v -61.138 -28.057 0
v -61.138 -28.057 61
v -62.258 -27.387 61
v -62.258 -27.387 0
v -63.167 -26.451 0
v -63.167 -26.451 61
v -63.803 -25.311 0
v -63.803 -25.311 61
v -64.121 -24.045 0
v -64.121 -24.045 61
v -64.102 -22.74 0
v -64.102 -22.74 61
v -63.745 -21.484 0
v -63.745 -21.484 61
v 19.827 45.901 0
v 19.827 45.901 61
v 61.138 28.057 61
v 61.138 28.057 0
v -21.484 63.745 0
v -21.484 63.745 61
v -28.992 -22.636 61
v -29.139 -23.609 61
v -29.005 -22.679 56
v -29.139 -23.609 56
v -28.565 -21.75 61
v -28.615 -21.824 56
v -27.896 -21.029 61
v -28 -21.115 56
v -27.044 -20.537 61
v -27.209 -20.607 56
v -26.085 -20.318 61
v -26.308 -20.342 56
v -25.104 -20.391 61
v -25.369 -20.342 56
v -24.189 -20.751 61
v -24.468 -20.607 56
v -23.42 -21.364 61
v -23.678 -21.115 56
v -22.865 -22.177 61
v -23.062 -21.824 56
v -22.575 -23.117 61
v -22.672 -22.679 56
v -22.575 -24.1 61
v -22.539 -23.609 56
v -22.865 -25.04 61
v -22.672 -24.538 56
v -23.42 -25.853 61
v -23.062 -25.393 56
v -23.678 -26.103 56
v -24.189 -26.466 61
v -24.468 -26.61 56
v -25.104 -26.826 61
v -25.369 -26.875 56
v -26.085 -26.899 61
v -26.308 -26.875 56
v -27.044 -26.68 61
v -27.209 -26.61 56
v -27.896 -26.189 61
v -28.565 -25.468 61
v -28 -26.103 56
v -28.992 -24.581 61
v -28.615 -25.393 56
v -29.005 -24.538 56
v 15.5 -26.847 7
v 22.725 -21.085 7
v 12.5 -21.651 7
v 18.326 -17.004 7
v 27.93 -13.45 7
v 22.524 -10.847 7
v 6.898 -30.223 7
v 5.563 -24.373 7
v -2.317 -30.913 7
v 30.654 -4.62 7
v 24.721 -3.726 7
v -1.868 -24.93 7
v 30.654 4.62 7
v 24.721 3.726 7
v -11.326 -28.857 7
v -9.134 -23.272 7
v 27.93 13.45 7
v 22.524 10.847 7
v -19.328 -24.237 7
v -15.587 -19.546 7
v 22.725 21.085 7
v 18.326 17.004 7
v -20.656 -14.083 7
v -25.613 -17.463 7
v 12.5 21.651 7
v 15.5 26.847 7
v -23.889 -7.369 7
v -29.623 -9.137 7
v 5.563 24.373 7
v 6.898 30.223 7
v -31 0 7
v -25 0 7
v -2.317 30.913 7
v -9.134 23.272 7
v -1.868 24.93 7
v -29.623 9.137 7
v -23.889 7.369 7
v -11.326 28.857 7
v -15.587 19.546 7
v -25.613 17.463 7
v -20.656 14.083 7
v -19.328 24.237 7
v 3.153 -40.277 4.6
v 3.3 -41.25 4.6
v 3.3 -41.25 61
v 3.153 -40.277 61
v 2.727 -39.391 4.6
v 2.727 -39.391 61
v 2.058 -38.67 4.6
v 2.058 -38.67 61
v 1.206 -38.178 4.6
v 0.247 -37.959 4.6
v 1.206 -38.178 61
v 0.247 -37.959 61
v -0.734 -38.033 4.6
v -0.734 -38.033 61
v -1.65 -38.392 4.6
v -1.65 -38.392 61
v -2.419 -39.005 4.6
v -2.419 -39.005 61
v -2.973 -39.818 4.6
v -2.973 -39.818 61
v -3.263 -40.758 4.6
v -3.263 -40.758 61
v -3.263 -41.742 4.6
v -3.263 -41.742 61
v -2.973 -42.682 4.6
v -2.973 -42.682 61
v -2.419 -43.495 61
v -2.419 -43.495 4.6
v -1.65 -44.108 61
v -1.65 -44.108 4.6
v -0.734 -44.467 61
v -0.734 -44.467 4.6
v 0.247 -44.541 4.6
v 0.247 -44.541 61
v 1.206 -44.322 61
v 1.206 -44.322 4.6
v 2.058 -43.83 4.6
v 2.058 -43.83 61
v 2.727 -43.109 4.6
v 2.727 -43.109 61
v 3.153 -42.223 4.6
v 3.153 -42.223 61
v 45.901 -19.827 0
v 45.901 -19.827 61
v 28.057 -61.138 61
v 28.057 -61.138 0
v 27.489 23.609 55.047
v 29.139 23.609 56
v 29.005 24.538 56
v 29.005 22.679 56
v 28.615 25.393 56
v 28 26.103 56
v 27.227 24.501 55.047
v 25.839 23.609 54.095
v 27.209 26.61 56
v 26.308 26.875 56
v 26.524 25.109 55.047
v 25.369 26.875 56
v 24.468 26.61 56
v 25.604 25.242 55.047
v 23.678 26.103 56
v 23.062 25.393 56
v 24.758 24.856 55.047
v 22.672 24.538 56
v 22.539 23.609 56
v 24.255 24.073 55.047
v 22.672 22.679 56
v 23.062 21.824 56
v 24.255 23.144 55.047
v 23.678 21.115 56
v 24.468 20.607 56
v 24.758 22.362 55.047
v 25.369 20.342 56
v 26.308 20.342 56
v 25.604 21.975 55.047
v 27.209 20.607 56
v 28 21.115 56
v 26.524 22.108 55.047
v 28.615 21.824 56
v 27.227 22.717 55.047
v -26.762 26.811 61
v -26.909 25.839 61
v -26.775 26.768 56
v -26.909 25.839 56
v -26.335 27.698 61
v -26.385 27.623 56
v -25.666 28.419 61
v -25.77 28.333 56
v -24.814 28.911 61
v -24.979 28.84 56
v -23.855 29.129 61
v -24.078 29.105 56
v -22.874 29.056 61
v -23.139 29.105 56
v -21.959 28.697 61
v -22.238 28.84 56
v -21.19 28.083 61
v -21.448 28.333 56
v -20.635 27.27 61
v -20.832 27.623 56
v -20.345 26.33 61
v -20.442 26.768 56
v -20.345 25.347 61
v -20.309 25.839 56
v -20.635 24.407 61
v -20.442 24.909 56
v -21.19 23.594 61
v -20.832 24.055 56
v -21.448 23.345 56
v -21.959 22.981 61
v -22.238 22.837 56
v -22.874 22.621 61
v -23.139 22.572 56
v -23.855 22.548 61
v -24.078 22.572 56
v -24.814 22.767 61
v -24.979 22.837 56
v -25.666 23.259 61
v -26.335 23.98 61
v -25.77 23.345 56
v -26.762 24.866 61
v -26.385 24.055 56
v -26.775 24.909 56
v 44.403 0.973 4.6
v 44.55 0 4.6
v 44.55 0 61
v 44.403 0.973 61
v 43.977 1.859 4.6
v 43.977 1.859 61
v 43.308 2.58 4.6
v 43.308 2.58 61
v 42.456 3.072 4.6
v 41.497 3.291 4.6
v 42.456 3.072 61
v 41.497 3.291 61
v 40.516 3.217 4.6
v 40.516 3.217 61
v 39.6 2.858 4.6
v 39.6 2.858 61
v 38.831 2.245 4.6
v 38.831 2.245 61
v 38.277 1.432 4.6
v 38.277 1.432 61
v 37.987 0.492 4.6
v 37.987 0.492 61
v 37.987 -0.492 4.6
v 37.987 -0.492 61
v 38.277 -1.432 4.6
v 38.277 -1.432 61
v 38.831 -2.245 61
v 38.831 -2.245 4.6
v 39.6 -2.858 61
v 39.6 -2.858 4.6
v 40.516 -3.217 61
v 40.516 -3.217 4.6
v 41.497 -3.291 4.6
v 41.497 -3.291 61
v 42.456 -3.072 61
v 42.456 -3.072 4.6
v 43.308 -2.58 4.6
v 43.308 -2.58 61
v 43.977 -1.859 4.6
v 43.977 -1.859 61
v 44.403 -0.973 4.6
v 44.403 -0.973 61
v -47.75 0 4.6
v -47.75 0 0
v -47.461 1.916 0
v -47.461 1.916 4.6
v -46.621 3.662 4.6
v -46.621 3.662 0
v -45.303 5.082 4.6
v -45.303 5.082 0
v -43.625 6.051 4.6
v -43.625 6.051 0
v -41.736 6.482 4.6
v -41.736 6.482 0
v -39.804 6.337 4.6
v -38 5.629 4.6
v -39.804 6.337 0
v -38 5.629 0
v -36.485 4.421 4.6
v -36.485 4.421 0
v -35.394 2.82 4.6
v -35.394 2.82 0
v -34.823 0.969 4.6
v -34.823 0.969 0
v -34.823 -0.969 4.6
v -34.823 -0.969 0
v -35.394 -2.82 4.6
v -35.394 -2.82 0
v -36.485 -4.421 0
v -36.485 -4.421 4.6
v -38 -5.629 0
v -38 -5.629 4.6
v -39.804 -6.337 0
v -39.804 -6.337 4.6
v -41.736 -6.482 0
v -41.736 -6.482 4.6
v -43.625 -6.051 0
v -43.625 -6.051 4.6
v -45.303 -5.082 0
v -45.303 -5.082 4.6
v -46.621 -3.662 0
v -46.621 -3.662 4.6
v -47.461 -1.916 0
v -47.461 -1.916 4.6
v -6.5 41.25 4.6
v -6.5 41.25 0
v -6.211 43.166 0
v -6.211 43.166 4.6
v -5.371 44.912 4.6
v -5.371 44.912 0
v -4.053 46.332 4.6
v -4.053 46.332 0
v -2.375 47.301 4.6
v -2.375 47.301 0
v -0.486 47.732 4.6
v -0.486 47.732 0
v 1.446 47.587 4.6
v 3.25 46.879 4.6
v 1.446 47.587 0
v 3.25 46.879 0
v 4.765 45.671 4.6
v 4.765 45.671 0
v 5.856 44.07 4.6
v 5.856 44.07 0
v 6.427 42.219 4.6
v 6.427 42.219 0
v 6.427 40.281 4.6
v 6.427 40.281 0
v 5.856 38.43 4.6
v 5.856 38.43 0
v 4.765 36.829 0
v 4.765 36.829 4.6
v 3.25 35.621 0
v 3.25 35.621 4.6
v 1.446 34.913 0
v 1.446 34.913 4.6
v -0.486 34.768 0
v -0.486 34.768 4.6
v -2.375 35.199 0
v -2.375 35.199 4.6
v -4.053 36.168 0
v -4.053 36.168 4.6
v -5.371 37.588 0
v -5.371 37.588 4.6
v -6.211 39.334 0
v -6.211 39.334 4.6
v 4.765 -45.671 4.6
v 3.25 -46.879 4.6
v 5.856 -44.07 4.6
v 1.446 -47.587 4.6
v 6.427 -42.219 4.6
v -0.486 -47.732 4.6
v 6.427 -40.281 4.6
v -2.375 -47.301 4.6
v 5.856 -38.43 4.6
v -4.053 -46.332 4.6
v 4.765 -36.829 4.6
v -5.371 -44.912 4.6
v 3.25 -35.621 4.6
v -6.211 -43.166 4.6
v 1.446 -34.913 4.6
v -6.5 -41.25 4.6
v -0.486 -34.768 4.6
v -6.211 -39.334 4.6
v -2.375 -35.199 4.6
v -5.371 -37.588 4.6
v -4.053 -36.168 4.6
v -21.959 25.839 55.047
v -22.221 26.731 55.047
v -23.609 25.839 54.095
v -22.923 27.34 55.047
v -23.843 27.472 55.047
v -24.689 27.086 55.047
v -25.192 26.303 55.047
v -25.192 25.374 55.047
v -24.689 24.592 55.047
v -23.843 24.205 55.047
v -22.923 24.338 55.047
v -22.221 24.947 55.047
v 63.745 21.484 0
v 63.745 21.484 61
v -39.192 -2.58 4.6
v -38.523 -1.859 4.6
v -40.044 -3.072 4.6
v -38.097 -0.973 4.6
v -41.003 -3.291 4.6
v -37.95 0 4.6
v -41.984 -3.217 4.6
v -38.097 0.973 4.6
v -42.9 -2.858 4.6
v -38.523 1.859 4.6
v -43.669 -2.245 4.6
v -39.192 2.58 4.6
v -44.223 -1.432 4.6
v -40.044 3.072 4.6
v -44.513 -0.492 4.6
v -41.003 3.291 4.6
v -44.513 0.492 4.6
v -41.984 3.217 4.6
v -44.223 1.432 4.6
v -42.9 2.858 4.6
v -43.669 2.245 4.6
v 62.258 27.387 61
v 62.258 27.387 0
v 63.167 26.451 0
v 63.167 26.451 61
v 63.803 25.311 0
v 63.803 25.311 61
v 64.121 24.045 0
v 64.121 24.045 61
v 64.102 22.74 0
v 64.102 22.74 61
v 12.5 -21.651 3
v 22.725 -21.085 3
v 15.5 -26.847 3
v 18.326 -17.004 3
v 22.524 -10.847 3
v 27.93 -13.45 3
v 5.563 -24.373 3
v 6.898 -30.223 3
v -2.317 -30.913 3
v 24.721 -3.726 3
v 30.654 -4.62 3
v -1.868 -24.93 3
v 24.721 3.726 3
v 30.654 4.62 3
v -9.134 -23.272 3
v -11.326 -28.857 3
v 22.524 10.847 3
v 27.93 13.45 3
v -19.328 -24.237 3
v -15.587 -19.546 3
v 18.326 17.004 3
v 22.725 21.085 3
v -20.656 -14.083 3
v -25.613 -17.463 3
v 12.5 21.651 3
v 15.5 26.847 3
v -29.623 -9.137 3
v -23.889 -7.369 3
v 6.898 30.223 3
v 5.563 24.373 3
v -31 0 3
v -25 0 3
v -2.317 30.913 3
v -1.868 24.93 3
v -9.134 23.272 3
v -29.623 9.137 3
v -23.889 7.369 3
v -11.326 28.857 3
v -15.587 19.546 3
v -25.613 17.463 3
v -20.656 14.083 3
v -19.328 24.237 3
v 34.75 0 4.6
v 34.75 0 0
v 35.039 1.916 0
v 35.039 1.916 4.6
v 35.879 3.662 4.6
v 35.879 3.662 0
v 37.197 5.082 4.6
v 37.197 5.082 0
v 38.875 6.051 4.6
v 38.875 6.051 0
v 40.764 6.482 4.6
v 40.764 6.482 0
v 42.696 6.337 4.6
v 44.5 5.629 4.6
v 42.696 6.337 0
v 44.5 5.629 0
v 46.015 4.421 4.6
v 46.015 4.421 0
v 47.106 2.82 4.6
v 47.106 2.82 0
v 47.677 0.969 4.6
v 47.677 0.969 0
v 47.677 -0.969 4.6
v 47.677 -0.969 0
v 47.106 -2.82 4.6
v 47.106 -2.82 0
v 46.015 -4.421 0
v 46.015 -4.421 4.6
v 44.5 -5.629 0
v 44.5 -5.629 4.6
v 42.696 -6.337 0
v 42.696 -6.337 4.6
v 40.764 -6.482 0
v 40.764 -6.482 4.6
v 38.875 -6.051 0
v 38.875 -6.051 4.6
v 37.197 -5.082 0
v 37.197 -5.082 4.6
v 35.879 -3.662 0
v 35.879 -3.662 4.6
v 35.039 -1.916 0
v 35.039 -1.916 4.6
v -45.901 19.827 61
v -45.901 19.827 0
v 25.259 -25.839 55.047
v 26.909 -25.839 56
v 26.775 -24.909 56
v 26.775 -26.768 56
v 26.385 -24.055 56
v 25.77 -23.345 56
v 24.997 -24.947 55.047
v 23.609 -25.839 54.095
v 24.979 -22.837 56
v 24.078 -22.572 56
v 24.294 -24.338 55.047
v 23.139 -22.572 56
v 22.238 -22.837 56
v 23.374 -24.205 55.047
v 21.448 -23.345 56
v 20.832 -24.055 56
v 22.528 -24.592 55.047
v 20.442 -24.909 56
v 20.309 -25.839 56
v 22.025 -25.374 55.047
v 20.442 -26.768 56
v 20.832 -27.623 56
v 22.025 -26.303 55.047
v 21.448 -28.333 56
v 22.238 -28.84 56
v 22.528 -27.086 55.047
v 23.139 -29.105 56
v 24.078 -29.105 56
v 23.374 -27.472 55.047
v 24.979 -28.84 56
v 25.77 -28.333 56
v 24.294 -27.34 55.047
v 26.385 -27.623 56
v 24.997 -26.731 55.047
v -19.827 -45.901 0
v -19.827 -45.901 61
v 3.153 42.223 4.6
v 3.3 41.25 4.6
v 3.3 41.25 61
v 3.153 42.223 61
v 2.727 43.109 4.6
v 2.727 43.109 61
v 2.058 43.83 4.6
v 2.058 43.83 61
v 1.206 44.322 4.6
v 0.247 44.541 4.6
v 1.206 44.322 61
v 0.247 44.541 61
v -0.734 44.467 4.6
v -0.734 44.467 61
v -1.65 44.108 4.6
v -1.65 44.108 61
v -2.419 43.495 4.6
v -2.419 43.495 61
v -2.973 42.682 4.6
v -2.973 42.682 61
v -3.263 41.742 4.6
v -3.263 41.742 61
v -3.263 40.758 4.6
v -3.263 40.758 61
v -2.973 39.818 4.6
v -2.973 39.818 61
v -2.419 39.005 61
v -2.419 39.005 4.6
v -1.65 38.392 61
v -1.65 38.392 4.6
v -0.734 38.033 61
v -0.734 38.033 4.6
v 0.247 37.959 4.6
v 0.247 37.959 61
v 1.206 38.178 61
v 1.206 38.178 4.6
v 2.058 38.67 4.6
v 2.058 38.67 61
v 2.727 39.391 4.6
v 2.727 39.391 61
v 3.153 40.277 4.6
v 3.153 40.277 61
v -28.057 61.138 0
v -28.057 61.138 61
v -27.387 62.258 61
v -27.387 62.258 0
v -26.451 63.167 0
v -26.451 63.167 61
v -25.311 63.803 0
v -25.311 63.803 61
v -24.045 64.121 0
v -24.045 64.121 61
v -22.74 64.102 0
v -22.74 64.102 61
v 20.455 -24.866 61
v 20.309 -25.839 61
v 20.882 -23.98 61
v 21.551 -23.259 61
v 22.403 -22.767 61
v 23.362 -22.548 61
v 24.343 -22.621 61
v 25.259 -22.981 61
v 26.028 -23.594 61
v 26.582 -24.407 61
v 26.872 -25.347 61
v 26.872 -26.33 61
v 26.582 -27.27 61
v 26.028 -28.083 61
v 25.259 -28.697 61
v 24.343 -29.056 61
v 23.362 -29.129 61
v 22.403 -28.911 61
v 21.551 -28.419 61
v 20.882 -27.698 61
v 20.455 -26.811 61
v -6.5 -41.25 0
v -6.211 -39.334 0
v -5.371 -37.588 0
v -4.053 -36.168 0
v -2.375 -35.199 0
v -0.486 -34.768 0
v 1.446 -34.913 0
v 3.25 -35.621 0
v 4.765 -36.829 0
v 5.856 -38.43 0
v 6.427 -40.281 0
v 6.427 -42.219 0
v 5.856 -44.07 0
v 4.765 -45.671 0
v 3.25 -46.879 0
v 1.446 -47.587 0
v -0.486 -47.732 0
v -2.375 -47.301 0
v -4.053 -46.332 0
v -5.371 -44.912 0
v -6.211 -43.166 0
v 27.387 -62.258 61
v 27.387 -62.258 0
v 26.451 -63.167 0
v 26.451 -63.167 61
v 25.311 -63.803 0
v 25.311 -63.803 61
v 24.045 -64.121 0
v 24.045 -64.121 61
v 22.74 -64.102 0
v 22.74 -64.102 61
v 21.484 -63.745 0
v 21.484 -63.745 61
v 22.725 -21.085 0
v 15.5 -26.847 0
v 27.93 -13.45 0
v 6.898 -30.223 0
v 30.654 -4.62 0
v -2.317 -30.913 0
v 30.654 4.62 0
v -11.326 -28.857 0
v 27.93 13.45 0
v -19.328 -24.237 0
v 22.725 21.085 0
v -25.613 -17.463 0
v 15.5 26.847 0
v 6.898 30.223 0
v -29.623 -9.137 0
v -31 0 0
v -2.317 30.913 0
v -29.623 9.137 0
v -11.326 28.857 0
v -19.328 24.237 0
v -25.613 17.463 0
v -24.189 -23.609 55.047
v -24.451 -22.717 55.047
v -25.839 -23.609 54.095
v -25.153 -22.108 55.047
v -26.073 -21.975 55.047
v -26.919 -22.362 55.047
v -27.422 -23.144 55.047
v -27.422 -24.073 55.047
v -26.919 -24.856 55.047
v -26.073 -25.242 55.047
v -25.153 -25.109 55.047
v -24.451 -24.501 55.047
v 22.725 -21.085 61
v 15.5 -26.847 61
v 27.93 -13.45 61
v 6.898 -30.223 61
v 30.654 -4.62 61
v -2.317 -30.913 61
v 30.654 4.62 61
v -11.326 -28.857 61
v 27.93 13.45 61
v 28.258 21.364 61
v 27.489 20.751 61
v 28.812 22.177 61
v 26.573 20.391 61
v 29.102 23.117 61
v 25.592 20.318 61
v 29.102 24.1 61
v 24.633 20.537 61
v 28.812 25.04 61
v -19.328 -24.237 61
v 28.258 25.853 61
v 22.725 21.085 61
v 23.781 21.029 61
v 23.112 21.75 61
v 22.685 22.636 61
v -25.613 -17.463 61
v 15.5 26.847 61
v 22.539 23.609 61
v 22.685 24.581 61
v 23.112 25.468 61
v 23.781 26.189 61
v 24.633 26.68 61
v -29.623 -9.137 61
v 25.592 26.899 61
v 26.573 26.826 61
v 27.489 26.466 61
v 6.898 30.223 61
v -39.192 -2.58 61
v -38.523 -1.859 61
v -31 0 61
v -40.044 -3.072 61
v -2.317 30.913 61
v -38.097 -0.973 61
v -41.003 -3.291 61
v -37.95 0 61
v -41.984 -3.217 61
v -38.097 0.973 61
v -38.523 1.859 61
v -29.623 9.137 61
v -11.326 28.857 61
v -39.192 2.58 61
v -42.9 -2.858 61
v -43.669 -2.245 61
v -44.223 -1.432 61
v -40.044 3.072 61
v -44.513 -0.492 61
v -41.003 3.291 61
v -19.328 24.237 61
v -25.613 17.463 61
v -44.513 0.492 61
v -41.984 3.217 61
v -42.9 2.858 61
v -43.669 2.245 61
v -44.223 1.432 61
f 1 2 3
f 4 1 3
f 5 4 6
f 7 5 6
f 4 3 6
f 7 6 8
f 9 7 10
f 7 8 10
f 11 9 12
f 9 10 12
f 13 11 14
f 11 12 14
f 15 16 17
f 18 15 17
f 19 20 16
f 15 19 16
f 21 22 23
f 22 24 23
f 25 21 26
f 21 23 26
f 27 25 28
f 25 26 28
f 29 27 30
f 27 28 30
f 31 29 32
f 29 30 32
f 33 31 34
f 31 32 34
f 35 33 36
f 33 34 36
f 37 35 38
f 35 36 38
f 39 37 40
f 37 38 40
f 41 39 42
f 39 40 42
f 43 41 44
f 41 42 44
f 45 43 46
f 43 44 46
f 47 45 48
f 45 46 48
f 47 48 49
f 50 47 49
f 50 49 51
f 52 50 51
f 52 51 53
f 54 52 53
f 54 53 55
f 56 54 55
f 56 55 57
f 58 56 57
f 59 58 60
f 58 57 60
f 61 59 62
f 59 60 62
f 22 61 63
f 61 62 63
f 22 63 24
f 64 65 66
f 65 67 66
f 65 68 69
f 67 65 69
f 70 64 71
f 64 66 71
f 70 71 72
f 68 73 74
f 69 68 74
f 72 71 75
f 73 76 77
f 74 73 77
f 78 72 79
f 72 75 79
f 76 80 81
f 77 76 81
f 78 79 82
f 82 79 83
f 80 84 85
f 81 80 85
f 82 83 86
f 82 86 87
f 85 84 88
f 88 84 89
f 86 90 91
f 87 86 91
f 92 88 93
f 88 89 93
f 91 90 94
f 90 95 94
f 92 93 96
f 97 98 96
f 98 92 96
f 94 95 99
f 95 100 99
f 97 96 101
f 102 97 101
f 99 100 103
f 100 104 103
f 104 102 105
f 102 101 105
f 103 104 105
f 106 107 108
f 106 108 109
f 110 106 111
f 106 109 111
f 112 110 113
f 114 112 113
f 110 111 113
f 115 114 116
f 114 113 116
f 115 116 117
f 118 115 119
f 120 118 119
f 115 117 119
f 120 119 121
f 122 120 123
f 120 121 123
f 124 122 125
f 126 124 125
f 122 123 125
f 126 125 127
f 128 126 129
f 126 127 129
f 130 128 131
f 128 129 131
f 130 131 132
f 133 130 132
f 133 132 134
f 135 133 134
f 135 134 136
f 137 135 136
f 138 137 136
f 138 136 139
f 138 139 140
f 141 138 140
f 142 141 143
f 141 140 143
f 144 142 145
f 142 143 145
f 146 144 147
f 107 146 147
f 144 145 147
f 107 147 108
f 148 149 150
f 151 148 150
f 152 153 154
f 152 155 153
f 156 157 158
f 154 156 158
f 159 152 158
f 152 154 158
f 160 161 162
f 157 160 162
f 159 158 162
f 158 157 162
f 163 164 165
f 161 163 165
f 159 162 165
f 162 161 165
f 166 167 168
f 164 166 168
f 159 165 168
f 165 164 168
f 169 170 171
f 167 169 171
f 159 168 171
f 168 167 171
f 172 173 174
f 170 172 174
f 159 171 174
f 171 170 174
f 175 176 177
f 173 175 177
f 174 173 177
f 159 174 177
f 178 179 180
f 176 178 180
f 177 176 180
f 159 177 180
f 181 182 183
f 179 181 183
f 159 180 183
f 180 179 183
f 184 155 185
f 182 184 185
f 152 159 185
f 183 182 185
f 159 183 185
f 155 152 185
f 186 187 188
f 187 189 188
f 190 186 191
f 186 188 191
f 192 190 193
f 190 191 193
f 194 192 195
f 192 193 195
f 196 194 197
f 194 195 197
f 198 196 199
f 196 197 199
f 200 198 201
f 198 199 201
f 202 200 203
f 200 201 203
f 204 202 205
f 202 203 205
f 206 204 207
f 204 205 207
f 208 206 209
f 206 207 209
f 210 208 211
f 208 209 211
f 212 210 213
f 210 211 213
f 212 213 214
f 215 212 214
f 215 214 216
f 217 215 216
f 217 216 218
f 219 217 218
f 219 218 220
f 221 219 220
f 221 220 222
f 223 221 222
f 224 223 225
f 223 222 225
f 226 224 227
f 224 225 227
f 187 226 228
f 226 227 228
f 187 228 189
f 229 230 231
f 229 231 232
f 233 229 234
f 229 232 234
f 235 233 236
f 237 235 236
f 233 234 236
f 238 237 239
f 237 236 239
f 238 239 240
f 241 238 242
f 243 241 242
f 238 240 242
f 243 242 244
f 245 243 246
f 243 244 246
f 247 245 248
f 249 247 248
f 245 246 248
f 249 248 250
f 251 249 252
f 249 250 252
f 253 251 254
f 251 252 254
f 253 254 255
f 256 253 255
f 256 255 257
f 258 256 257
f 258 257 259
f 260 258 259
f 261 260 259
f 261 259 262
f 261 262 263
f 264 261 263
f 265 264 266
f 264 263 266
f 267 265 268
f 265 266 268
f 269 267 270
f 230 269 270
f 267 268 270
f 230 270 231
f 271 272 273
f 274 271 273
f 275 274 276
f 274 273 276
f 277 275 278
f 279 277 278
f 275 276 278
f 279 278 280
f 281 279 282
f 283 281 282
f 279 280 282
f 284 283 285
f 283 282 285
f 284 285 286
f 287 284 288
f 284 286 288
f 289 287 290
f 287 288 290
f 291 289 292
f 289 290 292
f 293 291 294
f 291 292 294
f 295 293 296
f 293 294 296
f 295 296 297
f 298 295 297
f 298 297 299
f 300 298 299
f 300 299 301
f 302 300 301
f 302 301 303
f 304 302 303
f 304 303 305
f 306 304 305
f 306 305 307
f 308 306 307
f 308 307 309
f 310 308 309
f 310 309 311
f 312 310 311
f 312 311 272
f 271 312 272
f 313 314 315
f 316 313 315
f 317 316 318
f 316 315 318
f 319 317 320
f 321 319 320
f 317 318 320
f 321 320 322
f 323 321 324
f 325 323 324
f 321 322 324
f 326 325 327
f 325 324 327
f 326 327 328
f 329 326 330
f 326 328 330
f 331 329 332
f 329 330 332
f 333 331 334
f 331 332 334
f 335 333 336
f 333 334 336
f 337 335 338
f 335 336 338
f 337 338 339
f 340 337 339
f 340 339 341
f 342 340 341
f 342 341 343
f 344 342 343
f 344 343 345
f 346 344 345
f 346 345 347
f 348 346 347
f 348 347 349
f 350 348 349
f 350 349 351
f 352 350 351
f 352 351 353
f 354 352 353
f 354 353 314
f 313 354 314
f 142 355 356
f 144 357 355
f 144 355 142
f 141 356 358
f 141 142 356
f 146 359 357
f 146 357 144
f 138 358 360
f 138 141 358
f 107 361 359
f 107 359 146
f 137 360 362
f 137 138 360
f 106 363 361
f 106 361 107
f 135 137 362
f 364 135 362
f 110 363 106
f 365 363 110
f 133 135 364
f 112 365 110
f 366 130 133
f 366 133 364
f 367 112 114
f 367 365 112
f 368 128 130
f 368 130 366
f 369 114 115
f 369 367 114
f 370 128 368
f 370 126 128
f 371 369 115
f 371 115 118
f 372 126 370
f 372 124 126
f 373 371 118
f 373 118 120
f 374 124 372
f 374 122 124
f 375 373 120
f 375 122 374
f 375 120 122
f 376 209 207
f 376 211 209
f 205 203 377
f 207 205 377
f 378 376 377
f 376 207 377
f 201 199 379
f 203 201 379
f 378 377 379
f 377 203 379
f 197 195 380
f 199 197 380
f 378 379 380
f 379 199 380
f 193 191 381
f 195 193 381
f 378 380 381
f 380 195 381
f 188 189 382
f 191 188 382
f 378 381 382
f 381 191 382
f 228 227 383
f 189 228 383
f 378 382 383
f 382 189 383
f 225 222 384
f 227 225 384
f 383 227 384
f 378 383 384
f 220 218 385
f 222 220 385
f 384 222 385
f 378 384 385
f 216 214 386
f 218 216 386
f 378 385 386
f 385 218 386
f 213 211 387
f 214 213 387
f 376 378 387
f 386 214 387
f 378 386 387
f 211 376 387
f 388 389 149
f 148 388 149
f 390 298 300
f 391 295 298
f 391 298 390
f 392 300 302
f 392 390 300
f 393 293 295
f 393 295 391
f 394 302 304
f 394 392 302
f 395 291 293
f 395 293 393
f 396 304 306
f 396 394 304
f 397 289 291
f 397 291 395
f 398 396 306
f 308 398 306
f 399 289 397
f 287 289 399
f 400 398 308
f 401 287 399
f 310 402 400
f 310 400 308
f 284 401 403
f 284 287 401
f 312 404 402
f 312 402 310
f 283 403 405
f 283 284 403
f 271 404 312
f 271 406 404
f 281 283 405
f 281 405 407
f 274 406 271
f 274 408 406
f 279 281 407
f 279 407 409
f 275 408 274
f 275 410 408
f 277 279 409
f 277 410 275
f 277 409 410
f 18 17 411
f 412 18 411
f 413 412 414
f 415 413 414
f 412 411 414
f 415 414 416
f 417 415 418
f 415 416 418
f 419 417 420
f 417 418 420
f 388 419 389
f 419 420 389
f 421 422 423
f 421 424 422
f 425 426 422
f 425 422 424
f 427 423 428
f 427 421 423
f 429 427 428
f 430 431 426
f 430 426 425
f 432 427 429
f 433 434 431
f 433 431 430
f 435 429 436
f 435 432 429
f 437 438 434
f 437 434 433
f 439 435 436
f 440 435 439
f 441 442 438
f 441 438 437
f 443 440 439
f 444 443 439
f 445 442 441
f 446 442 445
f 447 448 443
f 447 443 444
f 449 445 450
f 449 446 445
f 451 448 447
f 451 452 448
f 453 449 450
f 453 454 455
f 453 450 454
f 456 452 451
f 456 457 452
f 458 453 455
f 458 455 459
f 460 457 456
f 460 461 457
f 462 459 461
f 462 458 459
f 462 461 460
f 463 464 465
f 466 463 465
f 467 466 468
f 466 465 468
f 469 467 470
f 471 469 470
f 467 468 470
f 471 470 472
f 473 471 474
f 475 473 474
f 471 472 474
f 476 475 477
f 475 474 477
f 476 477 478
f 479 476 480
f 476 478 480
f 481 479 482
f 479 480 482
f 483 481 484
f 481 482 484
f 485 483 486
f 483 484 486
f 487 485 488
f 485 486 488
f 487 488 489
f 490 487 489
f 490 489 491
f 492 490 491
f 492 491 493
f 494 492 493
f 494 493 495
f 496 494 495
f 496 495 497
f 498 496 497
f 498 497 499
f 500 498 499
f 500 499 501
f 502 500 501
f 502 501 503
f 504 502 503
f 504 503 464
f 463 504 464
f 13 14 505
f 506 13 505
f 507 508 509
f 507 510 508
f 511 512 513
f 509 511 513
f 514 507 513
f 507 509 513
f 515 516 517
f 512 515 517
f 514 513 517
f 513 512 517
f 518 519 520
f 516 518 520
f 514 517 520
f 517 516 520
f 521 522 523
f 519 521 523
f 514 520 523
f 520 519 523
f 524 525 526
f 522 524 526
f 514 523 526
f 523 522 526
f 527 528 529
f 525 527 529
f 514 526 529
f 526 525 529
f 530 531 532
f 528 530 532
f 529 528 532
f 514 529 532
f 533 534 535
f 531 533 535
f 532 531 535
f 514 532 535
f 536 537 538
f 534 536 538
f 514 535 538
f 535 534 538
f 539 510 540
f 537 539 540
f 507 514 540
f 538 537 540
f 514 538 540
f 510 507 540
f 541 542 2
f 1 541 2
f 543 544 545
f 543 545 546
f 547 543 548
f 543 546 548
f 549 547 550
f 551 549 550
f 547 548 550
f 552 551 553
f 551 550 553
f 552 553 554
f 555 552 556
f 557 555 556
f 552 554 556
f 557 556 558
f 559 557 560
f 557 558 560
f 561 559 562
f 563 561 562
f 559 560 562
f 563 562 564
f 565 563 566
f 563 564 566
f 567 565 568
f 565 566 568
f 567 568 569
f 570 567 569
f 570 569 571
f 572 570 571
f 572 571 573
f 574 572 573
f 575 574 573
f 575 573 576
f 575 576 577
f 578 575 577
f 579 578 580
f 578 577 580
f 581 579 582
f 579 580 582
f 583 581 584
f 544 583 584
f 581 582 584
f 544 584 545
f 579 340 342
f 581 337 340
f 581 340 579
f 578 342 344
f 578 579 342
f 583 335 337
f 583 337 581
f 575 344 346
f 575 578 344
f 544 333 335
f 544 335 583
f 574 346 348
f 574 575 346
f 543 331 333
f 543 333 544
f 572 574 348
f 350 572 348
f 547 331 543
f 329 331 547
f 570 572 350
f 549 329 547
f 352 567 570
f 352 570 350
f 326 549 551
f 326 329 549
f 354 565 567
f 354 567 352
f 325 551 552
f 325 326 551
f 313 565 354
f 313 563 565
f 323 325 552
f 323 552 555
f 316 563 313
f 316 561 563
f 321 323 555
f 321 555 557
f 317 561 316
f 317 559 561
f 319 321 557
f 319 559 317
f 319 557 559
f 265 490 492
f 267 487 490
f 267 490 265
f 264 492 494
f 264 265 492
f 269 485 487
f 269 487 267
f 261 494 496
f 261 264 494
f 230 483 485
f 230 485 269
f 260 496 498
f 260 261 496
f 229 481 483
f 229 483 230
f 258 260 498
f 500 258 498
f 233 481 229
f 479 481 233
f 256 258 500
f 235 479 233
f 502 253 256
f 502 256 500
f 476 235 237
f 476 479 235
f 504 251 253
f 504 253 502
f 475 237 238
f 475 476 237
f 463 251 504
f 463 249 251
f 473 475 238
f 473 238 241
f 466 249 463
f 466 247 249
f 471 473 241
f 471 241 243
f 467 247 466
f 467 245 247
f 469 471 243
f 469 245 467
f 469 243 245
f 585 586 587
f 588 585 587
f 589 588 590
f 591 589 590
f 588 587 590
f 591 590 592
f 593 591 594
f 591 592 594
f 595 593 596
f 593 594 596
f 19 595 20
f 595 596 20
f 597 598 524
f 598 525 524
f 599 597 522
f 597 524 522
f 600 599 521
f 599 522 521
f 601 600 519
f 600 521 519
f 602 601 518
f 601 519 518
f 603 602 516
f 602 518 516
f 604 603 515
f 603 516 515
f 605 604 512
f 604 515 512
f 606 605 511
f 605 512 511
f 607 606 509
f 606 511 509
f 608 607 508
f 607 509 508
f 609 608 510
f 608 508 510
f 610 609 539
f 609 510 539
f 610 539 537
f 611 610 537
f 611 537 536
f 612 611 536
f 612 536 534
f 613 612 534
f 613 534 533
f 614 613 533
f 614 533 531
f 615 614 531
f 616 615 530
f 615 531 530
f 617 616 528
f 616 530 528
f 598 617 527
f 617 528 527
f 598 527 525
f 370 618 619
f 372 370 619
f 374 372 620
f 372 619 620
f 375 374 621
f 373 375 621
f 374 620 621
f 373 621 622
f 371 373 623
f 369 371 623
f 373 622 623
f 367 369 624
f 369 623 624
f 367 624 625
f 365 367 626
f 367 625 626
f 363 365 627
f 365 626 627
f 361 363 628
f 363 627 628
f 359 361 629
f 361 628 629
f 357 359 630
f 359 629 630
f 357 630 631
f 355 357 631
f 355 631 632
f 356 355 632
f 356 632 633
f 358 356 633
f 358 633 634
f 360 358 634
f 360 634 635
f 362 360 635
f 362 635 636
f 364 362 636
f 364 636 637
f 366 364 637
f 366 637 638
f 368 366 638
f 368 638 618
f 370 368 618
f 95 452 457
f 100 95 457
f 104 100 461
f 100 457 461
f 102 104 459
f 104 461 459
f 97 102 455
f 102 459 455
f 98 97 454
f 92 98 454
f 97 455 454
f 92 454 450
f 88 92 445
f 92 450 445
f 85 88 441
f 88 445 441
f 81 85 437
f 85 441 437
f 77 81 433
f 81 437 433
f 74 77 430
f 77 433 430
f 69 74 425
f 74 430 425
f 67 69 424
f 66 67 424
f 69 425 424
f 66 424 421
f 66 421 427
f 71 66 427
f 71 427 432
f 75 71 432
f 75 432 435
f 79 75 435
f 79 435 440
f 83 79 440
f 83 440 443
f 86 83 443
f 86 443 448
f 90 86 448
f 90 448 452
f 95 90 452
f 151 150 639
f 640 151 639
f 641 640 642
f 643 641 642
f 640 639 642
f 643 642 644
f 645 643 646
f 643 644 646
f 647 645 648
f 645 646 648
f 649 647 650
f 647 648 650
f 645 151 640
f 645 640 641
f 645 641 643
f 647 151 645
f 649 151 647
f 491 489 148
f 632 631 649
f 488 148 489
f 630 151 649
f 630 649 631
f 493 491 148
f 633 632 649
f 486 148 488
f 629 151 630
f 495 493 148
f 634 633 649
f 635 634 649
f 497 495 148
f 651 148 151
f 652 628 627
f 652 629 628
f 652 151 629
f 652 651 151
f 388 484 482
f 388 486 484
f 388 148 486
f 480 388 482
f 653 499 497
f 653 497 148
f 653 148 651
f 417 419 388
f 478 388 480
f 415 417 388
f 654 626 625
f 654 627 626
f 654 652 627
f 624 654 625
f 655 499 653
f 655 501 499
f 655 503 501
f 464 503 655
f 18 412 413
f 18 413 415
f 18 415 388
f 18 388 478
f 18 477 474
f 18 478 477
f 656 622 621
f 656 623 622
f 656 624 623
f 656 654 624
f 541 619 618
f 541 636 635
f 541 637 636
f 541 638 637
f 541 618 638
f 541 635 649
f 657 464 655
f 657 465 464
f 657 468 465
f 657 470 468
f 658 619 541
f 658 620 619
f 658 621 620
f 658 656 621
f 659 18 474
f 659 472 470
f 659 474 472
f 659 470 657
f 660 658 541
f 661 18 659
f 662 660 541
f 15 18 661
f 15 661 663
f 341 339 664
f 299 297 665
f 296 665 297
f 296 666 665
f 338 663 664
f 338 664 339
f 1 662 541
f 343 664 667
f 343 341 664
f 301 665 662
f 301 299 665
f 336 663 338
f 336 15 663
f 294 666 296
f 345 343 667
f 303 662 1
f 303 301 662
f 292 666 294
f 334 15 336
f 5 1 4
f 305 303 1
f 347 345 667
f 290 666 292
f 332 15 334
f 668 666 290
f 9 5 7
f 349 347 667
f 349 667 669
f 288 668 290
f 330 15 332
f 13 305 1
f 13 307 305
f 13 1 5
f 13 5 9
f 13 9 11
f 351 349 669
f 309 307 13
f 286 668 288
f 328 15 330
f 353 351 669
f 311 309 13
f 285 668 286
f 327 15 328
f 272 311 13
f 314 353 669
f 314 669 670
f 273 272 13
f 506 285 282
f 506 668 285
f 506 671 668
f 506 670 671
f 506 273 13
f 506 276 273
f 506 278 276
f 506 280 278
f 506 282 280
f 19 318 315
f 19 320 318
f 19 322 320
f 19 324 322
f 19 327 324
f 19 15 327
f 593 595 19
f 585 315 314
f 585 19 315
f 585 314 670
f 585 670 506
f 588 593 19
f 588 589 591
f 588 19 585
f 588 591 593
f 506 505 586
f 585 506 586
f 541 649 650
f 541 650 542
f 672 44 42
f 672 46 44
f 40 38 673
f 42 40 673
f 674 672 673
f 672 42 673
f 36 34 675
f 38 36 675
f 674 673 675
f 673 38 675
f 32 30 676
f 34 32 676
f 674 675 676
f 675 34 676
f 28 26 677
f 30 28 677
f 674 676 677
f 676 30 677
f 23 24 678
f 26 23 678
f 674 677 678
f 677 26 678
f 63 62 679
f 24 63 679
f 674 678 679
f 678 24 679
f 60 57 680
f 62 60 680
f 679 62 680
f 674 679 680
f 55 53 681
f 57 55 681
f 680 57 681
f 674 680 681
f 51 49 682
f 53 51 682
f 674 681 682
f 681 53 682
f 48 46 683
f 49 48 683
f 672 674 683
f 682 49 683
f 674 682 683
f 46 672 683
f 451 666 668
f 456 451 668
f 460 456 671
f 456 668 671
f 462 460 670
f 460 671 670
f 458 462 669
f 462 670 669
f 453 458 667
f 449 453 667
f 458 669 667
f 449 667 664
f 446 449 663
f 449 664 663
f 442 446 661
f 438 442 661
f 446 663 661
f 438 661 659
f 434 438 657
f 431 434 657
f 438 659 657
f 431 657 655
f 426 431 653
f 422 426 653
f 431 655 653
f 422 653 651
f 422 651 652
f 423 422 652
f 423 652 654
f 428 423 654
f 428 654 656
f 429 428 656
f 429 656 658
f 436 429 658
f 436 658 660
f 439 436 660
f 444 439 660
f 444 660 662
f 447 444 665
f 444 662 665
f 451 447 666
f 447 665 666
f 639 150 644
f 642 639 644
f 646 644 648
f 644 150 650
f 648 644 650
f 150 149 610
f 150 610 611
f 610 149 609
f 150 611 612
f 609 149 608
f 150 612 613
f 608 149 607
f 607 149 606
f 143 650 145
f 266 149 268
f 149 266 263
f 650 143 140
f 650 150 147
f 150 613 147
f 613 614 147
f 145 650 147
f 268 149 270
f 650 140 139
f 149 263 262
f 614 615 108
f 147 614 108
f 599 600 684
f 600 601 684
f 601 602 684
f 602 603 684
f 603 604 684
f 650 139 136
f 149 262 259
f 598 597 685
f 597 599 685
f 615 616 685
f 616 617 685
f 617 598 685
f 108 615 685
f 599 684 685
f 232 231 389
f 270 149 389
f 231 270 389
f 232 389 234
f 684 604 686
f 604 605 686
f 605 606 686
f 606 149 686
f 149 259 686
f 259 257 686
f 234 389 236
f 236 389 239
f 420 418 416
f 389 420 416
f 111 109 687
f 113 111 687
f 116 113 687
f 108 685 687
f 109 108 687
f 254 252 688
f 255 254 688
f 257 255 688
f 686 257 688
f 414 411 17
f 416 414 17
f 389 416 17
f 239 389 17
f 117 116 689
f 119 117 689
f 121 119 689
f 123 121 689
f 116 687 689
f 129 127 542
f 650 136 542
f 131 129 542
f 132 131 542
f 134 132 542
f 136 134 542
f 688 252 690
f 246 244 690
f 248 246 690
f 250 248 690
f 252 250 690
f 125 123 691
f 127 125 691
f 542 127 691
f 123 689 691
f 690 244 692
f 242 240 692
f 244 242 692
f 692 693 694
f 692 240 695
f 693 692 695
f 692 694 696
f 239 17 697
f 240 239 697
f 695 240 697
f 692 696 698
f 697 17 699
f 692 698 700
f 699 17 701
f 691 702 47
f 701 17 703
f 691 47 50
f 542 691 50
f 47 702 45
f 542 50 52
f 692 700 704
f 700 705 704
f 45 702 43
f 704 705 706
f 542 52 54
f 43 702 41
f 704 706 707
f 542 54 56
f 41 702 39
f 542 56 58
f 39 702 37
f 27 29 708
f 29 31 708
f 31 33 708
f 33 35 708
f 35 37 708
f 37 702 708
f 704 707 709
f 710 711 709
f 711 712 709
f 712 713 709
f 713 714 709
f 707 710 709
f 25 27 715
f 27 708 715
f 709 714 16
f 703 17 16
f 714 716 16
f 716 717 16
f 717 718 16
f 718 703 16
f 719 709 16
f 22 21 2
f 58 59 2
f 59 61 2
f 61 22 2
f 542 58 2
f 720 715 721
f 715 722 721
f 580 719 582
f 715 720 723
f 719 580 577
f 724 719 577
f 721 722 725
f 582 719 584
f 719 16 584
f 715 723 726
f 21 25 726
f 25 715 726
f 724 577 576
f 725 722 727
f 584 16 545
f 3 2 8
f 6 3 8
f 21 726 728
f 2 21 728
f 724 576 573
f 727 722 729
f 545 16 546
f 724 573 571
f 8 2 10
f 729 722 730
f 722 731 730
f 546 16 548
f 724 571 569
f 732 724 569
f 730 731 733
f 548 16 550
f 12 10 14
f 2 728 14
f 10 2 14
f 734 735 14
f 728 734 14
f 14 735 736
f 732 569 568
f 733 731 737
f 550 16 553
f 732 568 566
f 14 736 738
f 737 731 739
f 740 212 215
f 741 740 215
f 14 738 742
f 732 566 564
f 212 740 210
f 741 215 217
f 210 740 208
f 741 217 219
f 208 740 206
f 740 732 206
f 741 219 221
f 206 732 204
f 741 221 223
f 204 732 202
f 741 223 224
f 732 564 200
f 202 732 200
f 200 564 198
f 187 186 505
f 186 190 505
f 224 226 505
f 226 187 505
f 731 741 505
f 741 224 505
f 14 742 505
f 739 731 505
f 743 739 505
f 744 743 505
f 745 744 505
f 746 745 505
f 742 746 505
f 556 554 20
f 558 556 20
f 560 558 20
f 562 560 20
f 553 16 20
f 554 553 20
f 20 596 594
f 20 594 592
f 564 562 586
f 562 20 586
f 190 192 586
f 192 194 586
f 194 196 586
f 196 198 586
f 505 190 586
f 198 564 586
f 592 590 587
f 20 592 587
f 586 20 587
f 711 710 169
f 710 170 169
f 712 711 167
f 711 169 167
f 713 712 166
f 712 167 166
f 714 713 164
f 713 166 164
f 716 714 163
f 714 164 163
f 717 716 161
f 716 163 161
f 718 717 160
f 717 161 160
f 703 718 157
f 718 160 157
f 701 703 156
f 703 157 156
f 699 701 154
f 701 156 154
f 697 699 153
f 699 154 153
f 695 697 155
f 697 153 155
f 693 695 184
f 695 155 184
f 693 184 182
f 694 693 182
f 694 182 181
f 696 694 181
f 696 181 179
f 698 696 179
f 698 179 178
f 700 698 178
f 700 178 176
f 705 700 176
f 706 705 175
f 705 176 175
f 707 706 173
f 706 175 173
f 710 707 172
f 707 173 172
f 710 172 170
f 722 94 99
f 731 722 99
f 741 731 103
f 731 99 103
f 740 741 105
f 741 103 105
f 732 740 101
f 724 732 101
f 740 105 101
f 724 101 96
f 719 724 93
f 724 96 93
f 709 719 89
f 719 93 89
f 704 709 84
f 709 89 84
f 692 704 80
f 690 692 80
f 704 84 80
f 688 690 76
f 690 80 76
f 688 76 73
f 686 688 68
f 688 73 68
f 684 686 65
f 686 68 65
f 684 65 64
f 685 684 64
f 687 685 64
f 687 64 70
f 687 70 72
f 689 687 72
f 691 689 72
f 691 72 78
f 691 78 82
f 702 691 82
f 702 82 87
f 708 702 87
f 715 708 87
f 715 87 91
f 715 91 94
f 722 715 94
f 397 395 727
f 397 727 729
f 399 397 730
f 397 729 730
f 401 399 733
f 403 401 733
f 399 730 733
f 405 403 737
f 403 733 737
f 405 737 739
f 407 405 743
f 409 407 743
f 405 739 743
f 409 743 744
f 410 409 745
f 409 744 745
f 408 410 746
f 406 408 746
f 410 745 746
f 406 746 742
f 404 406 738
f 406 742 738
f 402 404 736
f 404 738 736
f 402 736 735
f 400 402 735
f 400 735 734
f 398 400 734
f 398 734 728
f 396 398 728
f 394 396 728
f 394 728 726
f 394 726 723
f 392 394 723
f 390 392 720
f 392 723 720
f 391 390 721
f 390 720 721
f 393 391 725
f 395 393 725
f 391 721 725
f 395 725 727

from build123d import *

# Parameters (mm, degrees)
ESQUISSE1_R                                        = 50
BOSS_EXTRU_1_DEPTH                                 = 61
ESQUISSE2_R                                        = 31
ENL_V_MAT_EXTRU_1_DEPTH                            = 72
CHAMBRAGE_POUR_VIS_T_TE_RONDE_BOMB_E_M_D           = 6.6
CHAMBRAGE_POUR_VIS_T_TE_RONDE_BOMB_E_M_CBORE_D     = 13
CHAMBRAGE_POUR_VIS_T_TE_RONDE_BOMB_E_M_CBORE_DEPTH = 4.6
D_GAGEMENT_M61_D                                   = 6.6
D_GAGEMENT_M61_DEPTH                               = 5
D_GAGEMENT_M61_TIP                                 = 1.905255888
BOSS_EXTRU_2_START                                 = -61
BOSS_EXTRU_2_DEPTH                                 = 61
ESQUISSE23_R                                       = 31
ESQUISSE23_R_2                                     = 25
BOSS_EXTRU_3_DEPTH                                 = 7
ESQUISSE24_R                                       = 31
ENL_V_MAT_EXTRU_2_DEPTH                            = 3


with BuildPart() as part:
    # Esquisse1 → Boss.-Extru.1 (new body)
    with BuildSketch(Plane.XY):
        with Locations(Location((0, 0, 0), (0, 0, 180))):
            Circle(ESQUISSE1_R)
    extrude(amount=BOSS_EXTRU_1_DEPTH)

    # Esquisse2 → Enlèv. mat.-Extru.1 (cut)
    with BuildSketch(Plane(origin=(0, 0, 0), x_dir=(-1, 0, 0), z_dir=(0, 0, -1))):
        Circle(ESQUISSE2_R)
    extrude(amount=-ENL_V_MAT_EXTRU_1_DEPTH, mode=Mode.SUBTRACT)

    # Chambrage pour vis à tête ronde bombée M61 (through all)
    with Locations(Plane(origin=(0, 0, 0), x_dir=(-1, 0, 0), z_dir=(0, 0, -1))):
        with Locations((41.25, 0), (0, 41.25), (-41.25, 0), (0, -41.25)):
            CounterBoreHole(CHAMBRAGE_POUR_VIS_T_TE_RONDE_BOMB_E_M_D / 2, CHAMBRAGE_POUR_VIS_T_TE_RONDE_BOMB_E_M_CBORE_D / 2, CHAMBRAGE_POUR_VIS_T_TE_RONDE_BOMB_E_M_CBORE_DEPTH)

    # Dégagement M61
    with Locations(Plane.XY.offset(61)):
        with Locations((-23.608593004, 25.838621023), (-25.838621023, -23.608593004), (23.608593004, -25.838621023), (25.838621023, 23.608593004)):
            Hole(D_GAGEMENT_M61_D / 2, depth=D_GAGEMENT_M61_DEPTH)
            with Locations((0, 0, -(D_GAGEMENT_M61_DEPTH + D_GAGEMENT_M61_TIP / 2))):  # 120° drill point
                Cone(0, D_GAGEMENT_M61_D / 2, D_GAGEMENT_M61_TIP, mode=Mode.SUBTRACT)

    # Esquisse20 → Boss.-Extru.2 (add)
    with BuildSketch(Plane(origin=(0, 0, 0), x_dir=(-1, 0, 0), z_dir=(0, 0, -1)).offset(BOSS_EXTRU_2_START)):
        with BuildLine():
            Line((45.900985342, 19.826738123), (28.056919844, 61.137625476))
            ThreePointArc((28.056919844, 61.137625476), (25.31054896, 63.802603508), (21.484147447, 63.74505007))
            Line((21.484147447, 63.74505007), (-19.826738428, 45.900985211))
            ThreePointArc((-19.826738428, 45.900985211), (18.437276869, 46.476519036), (45.900985342, 19.826738123))
        make_face()
        with BuildLine():
            Line((63.74505007, -21.484147447), (45.900985342, 19.826738123))
            ThreePointArc((45.900985342, 19.826738123), (46.47651917, -18.437276529), (19.826739099, -45.900984921))
            Line((19.826739099, -45.900984921), (61.137625476, -28.056919844))
            ThreePointArc((61.137625476, -28.056919844), (63.802603508, -25.31054896), (63.74505007, -21.484147447))
        make_face()
        with BuildLine():
            ThreePointArc((-45.900984787, -19.82673941), (-46.476519294, 18.437276217), (-19.826738428, 45.900985211))
            Line((-19.826738428, 45.900985211), (-61.137625476, 28.056919844))
            ThreePointArc((-61.137625476, 28.056919844), (-63.802603508, 25.31054896), (-63.74505007, 21.484147447))
            Line((-63.74505007, 21.484147447), (-45.900984787, -19.82673941))
        make_face()
        with BuildLine():
            Line((-21.484147447, -63.74505007), (19.826739099, -45.900984921))
            ThreePointArc((19.826739099, -45.900984921), (-18.437275878, -46.476519429), (-45.900984787, -19.82673941))
            Line((-45.900984787, -19.82673941), (-28.056919844, -61.137625476))
            ThreePointArc((-28.056919844, -61.137625476), (-25.31054896, -63.802603508), (-21.484147447, -63.74505007))
        make_face()
    extrude(amount=BOSS_EXTRU_2_DEPTH)

    # Esquisse23 → Boss.-Extru.3 (add)
    with BuildSketch(Plane(origin=(0, 0, 0), x_dir=(-1, 0, 0), z_dir=(0, 0, -1))):
        Circle(ESQUISSE23_R)
        Circle(ESQUISSE23_R_2, mode=Mode.SUBTRACT)
    extrude(amount=-BOSS_EXTRU_3_DEPTH)

    # Esquisse24 → Enlèv. mat.-Extru.2 (cut)
    with BuildSketch(Plane(origin=(0, 0, 0), x_dir=(-1, 0, 0), z_dir=(0, 0, -1))):
        Circle(ESQUISSE24_R)
    extrude(amount=-ENL_V_MAT_EXTRU_2_DEPTH, mode=Mode.SUBTRACT)


solid = part.part
